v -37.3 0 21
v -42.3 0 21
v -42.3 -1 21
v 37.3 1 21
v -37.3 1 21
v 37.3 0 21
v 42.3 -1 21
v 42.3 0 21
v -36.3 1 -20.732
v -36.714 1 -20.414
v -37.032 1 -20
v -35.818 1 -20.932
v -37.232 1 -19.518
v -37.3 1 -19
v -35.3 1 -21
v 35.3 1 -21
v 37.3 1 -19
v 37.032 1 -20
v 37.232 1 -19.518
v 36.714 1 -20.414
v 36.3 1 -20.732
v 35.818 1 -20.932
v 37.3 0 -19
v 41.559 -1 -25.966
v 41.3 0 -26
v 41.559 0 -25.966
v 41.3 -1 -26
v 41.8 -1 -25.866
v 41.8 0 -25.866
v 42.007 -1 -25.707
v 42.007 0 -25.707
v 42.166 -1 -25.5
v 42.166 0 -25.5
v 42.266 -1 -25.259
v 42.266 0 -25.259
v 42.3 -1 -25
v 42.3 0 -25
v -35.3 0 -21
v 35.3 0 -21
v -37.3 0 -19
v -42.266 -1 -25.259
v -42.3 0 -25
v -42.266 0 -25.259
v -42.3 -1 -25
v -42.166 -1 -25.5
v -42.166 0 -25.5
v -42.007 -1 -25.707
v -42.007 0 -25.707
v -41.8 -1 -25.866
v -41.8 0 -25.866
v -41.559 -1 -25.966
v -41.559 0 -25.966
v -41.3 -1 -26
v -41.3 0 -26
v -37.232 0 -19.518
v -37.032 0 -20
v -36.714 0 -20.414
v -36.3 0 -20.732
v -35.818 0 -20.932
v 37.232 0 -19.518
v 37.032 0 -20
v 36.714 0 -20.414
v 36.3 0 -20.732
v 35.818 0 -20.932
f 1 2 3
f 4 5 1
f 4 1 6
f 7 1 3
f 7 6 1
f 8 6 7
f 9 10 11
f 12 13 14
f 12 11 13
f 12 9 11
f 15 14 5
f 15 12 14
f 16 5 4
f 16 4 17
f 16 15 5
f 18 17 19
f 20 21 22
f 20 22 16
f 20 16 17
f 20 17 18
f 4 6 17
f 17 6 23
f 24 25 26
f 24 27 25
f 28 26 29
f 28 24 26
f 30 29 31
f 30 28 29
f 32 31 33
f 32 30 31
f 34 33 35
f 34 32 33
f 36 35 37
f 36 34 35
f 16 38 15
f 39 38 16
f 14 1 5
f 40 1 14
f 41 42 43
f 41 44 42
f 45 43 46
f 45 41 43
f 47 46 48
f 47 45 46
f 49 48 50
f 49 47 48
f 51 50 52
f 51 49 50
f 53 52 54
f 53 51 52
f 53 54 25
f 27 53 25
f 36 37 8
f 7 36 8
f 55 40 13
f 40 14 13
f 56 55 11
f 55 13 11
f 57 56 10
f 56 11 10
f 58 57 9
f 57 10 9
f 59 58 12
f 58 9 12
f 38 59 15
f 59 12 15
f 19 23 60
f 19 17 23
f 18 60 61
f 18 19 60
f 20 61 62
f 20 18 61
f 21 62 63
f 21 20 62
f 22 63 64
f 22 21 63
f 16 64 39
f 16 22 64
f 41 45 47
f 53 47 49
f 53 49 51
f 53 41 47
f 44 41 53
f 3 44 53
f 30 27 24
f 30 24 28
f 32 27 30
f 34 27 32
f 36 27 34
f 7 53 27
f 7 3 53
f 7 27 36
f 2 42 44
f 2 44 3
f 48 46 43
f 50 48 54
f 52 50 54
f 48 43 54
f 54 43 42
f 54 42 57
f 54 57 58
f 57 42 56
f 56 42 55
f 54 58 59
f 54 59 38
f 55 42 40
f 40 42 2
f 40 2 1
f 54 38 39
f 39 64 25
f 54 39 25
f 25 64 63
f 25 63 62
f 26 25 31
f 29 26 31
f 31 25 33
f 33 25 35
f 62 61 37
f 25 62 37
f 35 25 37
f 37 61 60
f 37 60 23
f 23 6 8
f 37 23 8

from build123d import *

# Parameters (mm, degrees)
SKETCH_1_W      = 74.6
SKETCH_1_H      = 42
EXTRUDE_1_DEPTH = 1
FILLET_1_R      = 2
SKETCH_2_W      = 84.6
SKETCH_2_H      = 47
EXTRUDE_2_DEPTH = 1
FILLET_2_R      = 1


with BuildPart() as part:
    # Эскиз1 → Бобышка-Вытянуть1 (new body)
    with BuildSketch(Plane(origin=(0, 0, 0), x_dir=(1, 0, 0), z_dir=(0, 1, 0))):
        Rectangle(SKETCH_1_W, SKETCH_1_H)
    extrude(amount=EXTRUDE_1_DEPTH)

    # Скругление1
    fillet_1_edges = [part.edges().sort_by_distance(p)[0] for p in [
        (-37.3, 0.5, -21),
        (37.3, 0.5, -21),
    ]]
    fillet(fillet_1_edges, radius=FILLET_1_R)

    # Эскиз2 → Бобышка-Вытянуть2 (add)
    with BuildSketch(Plane.XZ):
        with Locations((0, -2.5)):
            Rectangle(SKETCH_2_W, SKETCH_2_H)
    extrude(amount=EXTRUDE_2_DEPTH)

    # Скругление2
    fillet_2_edges = [part.edges().sort_by_distance(p)[0] for p in [
        (-42.3, -0.5, -26),
        (42.3, -0.5, -26),
    ]]
    fillet(fillet_2_edges, radius=FILLET_2_R)


solid = part.part
